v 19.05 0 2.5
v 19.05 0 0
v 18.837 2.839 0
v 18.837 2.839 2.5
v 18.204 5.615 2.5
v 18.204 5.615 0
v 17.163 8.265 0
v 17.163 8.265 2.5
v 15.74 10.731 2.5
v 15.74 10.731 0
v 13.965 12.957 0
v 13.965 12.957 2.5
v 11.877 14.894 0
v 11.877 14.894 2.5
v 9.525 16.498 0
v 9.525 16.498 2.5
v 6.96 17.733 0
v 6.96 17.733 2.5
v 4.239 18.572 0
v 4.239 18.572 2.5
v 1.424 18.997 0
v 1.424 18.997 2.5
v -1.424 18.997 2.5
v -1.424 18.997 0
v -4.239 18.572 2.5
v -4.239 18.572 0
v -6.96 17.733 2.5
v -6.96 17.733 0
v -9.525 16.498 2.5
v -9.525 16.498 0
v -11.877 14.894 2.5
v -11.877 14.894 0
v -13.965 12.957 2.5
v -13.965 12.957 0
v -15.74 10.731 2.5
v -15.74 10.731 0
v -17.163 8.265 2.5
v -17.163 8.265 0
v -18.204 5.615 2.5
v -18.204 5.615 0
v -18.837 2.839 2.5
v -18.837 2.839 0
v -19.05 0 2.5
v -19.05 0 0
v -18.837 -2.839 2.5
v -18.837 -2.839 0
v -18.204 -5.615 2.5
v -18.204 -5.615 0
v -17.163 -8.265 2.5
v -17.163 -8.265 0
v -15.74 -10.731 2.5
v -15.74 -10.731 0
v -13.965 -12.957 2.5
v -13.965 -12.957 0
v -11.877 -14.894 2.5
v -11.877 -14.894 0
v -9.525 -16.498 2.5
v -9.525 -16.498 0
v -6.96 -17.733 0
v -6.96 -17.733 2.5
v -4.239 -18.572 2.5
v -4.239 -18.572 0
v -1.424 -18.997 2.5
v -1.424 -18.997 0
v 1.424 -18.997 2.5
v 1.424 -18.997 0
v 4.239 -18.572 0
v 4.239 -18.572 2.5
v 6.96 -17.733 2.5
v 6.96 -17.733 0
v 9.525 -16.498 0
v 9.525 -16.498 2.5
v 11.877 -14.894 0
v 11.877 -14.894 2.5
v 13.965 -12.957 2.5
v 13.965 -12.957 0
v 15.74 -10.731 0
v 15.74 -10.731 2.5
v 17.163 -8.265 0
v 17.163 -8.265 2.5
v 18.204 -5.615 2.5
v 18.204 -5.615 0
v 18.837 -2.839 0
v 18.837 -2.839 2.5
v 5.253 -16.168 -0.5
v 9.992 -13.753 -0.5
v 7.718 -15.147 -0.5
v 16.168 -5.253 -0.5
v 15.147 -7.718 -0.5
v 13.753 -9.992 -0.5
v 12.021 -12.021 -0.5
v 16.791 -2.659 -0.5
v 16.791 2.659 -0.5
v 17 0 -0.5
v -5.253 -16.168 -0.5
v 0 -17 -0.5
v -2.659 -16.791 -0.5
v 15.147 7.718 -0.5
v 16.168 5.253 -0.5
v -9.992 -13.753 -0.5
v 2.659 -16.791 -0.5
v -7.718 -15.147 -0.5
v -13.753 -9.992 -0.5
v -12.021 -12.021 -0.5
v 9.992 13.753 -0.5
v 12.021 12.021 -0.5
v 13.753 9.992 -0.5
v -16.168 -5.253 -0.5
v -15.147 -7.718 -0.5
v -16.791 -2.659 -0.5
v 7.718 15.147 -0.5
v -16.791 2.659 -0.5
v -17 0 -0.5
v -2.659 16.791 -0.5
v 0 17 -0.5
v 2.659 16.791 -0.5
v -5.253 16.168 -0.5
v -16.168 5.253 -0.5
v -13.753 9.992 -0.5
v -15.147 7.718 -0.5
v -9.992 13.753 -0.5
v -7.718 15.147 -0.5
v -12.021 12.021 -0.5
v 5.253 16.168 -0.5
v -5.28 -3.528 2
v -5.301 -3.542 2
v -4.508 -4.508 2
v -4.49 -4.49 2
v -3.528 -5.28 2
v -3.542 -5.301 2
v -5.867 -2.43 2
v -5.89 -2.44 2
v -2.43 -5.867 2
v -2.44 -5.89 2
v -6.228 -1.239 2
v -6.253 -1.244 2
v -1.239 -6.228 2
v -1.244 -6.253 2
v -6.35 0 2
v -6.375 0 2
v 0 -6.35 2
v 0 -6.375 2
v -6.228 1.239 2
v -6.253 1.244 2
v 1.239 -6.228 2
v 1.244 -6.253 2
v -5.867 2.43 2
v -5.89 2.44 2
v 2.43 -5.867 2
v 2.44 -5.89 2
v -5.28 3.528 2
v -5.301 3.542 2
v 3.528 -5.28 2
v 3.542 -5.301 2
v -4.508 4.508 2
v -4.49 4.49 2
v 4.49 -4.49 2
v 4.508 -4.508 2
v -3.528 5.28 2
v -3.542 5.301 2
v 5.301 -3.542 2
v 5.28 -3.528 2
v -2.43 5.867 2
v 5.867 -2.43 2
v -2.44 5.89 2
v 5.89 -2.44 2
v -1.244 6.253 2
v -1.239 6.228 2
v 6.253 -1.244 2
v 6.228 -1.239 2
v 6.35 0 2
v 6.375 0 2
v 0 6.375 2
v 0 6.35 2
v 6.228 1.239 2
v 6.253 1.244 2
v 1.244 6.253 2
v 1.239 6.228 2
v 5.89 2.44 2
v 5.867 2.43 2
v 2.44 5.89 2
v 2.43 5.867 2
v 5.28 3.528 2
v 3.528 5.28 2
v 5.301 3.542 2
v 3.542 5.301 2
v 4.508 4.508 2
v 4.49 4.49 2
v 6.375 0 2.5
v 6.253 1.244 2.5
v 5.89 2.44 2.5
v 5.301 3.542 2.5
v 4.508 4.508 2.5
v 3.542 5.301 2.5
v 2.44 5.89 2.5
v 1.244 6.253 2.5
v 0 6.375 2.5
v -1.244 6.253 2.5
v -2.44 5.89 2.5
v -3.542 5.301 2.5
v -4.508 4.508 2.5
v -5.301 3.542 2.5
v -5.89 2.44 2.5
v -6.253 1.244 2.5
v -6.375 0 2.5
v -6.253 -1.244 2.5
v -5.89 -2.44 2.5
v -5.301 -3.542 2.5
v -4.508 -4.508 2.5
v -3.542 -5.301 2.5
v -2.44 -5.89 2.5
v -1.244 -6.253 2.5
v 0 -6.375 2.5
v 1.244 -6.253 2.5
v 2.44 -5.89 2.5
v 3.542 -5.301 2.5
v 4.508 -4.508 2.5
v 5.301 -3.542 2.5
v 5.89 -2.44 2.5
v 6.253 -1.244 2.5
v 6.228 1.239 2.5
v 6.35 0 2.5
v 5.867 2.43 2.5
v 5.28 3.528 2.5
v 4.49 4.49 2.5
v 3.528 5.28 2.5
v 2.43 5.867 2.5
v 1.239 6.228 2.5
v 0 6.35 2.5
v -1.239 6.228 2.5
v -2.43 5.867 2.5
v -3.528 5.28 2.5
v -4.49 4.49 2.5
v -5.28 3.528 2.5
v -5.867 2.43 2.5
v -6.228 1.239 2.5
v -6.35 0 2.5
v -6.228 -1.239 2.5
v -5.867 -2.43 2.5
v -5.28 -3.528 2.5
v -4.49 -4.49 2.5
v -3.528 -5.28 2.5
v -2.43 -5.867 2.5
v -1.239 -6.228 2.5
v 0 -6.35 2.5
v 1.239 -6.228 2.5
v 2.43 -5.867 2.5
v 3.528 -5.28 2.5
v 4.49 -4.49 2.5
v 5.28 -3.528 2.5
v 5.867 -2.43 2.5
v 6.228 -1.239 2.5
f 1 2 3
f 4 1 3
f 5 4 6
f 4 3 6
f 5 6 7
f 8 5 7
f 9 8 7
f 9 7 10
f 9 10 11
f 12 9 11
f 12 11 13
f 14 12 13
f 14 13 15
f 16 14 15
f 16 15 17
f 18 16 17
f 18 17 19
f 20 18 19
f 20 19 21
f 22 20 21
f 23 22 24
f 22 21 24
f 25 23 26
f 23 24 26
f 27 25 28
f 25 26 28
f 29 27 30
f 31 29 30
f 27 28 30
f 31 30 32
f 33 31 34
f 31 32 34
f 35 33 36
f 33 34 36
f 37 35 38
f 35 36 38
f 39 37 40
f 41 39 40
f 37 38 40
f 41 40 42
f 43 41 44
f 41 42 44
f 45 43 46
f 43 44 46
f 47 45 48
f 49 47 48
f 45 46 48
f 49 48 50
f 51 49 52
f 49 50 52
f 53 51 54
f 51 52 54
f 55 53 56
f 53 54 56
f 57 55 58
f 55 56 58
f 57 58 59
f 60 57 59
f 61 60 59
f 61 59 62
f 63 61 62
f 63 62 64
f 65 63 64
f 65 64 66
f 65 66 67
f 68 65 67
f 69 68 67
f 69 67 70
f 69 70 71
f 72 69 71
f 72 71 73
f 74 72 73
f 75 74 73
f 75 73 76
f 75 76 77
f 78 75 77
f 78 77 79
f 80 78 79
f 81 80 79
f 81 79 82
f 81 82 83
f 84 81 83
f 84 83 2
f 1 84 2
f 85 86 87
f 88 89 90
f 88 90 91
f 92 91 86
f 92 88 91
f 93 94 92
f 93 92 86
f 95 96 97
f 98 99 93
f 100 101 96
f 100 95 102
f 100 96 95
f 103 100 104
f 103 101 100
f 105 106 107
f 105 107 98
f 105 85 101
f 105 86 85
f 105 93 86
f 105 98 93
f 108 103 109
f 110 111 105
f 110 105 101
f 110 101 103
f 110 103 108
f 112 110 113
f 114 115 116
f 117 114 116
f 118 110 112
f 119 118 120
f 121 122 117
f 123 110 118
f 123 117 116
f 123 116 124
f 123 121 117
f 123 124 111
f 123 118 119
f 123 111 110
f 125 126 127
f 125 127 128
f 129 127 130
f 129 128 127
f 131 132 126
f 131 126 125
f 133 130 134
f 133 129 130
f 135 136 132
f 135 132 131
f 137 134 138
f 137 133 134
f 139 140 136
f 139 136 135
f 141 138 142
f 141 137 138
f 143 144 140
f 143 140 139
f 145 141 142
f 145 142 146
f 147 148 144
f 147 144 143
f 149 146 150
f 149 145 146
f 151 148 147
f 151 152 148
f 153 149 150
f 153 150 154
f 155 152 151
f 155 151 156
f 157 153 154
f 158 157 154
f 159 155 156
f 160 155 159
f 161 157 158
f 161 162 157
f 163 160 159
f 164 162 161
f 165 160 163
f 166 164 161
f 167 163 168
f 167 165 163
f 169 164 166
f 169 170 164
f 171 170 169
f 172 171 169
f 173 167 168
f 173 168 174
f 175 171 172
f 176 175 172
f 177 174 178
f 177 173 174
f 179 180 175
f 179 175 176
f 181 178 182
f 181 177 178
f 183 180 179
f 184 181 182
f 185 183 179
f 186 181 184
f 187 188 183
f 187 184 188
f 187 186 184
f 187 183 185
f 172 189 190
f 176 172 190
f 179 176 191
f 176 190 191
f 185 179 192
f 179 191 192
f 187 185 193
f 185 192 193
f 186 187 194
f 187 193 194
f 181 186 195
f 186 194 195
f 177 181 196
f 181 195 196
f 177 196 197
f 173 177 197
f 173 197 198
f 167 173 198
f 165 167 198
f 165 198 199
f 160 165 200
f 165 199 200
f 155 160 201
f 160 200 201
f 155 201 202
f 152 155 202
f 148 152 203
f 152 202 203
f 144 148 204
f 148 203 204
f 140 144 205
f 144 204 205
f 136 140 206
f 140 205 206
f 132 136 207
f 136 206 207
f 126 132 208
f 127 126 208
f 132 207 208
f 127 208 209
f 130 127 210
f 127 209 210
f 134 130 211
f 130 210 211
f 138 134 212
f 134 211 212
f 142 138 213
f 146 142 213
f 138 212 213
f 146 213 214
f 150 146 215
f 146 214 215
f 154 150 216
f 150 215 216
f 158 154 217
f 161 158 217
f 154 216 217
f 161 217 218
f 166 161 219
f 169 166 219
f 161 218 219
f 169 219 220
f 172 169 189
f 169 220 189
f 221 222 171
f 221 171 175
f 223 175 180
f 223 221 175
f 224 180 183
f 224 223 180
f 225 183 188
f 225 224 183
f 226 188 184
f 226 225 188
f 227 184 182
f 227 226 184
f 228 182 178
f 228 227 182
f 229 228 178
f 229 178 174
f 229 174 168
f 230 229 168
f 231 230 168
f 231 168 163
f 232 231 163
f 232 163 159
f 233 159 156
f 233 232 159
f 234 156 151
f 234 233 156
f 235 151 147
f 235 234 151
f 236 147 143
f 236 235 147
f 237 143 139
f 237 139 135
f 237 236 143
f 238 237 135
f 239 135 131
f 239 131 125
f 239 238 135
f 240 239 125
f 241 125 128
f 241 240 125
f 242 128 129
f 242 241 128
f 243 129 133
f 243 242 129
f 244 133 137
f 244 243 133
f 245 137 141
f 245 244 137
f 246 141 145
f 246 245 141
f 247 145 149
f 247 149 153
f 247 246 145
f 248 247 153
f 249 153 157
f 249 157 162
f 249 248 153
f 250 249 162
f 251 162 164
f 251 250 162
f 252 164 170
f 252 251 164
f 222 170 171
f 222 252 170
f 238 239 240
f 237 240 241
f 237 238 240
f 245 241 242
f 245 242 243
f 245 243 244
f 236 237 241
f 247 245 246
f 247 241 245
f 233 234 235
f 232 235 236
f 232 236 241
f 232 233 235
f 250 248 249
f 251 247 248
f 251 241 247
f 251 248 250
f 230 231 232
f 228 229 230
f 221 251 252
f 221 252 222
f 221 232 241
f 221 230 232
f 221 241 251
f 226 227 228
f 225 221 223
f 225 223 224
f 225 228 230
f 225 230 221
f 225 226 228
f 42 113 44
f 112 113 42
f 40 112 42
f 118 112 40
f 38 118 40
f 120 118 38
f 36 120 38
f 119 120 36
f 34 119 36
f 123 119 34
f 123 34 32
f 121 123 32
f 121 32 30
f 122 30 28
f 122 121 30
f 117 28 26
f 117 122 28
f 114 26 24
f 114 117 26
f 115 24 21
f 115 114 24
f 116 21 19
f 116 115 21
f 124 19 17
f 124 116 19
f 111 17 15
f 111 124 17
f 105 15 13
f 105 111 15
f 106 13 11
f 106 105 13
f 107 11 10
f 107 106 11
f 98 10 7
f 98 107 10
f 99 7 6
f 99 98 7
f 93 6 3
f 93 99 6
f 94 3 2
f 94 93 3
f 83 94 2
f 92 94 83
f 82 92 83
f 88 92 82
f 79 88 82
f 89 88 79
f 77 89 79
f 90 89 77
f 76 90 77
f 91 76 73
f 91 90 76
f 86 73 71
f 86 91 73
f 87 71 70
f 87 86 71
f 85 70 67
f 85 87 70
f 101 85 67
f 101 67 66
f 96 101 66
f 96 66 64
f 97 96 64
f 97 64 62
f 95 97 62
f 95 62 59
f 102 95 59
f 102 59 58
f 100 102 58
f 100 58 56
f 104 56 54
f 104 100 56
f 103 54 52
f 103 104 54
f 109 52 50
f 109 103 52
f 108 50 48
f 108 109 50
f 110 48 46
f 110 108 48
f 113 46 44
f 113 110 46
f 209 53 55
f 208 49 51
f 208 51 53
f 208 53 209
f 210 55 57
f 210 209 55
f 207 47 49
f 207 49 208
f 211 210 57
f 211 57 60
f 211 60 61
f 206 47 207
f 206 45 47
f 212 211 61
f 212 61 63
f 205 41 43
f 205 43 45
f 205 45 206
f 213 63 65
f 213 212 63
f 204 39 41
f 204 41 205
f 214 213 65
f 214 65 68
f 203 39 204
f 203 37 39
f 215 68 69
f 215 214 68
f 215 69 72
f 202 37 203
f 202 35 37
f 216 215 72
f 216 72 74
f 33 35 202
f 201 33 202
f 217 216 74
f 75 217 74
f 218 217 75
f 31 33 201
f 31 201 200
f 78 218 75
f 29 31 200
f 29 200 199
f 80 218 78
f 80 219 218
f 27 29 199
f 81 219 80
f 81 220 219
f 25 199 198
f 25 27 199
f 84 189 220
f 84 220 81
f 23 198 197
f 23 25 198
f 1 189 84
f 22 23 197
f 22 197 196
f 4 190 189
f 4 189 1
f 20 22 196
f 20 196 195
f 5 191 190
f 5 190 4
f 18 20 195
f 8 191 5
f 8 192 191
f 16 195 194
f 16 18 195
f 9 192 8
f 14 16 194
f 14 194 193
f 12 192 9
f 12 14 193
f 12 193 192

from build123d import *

# Parameters (mm, degrees)
F0_R     = 19.05
F1_DEPTH = 2.5
F2_R     = 6.375
F2_R_2   = 6.35
F3_DEPTH = 0.5


with BuildPart() as f1:
    # F0 (on Top) → F1 (new body)
    with BuildSketch(Plane.XY):
        Circle(F0_R)
    extrude(amount=F1_DEPTH)

    # F2 (on face) → F3 (cut)
    with BuildSketch(Plane.XY.offset(2.5)):
        Circle(F2_R)
        Circle(F2_R_2, mode=Mode.SUBTRACT)
    extrude(amount=-F3_DEPTH, mode=Mode.SUBTRACT)

    # F4 (on Front) → F5 (revolve)
    with BuildSketch(Plane.XZ):
        Polygon((0, -0.5), (0, 0), (-19.05, 0), (-17, -0.5), align=None)
    revolve(axis=Axis((0, 0, -0.25), (0, 0, -1)))


solid = f1.part
